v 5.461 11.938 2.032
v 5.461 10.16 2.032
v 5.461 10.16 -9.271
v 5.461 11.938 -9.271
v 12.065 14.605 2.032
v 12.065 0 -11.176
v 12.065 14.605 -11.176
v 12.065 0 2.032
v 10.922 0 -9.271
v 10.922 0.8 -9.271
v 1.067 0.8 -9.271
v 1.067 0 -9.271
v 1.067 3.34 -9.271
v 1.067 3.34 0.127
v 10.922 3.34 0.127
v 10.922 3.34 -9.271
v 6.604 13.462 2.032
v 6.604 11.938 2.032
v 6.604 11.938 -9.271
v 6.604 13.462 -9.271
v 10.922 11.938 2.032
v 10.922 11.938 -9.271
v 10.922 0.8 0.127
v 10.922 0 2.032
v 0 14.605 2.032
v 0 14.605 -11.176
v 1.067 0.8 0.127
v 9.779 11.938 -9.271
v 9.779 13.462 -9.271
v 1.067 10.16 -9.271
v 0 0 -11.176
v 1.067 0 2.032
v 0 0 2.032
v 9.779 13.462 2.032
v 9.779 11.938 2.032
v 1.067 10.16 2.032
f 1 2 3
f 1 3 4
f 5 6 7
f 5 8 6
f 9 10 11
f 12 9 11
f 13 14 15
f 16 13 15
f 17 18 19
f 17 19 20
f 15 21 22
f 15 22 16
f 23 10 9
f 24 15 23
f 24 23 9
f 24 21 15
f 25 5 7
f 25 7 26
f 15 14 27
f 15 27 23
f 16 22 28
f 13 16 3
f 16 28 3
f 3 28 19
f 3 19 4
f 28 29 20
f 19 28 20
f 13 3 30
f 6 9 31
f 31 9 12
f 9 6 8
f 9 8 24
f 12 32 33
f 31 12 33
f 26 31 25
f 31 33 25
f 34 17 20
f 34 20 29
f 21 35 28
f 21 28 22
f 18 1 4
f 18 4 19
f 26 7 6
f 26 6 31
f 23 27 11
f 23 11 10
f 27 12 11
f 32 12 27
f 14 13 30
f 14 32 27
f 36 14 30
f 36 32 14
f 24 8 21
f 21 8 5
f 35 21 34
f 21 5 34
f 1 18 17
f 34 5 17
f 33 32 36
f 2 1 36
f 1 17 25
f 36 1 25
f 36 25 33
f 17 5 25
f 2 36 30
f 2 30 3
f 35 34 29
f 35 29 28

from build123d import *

# Parameters (mm, degrees)
EXTRUDE1_DEPTH = 2.032
SKETCH2_W      = 9.8552
SKETCH2_H      = 2.54
EXTRUDE3_DEPTH = 11.303
SKETCH3_W      = 9.8552
SKETCH3_H      = 2.54
EXTRUDE4_DEPTH = 1.905
SKETCH4_W      = 12.065
SKETCH4_H      = 14.605
EXTRUDE5_DEPTH = 1.905


with BuildPart() as part:
    # Sketch1 → Extrude1 (new body)
    with BuildSketch(Plane.XY):
        Polygon((0, 0), (0, 14.605), (12.065, 14.605), (12.065, 0), (10.922, 0), (10.922, 11.938), (9.779, 11.938), (9.779, 13.462), (6.604, 13.462), (6.604, 11.938), (5.461, 11.938), (5.461, 10.16), (1.0668, 10.16), (1.0668, 0), align=None)
    extrude(amount=EXTRUDE1_DEPTH)

    # Sketch2 → Extrude3 (add)
    with BuildSketch(Plane.XY.offset(2.032)):
        Polygon((0, 14.605), (0, 0), (1.0668, 0), (1.0668, 10.16), (5.461, 10.16), (5.461, 11.938), (6.604, 11.938), (6.604, 13.462), (9.779, 13.462), (9.779, 11.938), (10.922, 11.938), (10.922, 0), (12.065, 0), (12.065, 14.605), align=None)
        with Locations((5.9944, 2.0701)):
            Rectangle(SKETCH2_W, SKETCH2_H)
    extrude(amount=-EXTRUDE3_DEPTH)

    # Sketch3 → Extrude4 (cut)
    with BuildSketch(Plane.XY.offset(2.032)):
        with Locations((5.9944, 2.0701)):
            Rectangle(SKETCH3_W, SKETCH3_H)
    extrude(amount=-EXTRUDE4_DEPTH, mode=Mode.SUBTRACT)

    # Sketch4 → Extrude5 (add)
    with BuildSketch(Plane(origin=(0, 0, -9.271), x_dir=(-1, 0, 0), z_dir=(0, 0, -1))):
        with Locations((-6.0325, 7.3025)):
            Rectangle(SKETCH4_W, SKETCH4_H)
    extrude(amount=EXTRUDE5_DEPTH)


solid = part.part
